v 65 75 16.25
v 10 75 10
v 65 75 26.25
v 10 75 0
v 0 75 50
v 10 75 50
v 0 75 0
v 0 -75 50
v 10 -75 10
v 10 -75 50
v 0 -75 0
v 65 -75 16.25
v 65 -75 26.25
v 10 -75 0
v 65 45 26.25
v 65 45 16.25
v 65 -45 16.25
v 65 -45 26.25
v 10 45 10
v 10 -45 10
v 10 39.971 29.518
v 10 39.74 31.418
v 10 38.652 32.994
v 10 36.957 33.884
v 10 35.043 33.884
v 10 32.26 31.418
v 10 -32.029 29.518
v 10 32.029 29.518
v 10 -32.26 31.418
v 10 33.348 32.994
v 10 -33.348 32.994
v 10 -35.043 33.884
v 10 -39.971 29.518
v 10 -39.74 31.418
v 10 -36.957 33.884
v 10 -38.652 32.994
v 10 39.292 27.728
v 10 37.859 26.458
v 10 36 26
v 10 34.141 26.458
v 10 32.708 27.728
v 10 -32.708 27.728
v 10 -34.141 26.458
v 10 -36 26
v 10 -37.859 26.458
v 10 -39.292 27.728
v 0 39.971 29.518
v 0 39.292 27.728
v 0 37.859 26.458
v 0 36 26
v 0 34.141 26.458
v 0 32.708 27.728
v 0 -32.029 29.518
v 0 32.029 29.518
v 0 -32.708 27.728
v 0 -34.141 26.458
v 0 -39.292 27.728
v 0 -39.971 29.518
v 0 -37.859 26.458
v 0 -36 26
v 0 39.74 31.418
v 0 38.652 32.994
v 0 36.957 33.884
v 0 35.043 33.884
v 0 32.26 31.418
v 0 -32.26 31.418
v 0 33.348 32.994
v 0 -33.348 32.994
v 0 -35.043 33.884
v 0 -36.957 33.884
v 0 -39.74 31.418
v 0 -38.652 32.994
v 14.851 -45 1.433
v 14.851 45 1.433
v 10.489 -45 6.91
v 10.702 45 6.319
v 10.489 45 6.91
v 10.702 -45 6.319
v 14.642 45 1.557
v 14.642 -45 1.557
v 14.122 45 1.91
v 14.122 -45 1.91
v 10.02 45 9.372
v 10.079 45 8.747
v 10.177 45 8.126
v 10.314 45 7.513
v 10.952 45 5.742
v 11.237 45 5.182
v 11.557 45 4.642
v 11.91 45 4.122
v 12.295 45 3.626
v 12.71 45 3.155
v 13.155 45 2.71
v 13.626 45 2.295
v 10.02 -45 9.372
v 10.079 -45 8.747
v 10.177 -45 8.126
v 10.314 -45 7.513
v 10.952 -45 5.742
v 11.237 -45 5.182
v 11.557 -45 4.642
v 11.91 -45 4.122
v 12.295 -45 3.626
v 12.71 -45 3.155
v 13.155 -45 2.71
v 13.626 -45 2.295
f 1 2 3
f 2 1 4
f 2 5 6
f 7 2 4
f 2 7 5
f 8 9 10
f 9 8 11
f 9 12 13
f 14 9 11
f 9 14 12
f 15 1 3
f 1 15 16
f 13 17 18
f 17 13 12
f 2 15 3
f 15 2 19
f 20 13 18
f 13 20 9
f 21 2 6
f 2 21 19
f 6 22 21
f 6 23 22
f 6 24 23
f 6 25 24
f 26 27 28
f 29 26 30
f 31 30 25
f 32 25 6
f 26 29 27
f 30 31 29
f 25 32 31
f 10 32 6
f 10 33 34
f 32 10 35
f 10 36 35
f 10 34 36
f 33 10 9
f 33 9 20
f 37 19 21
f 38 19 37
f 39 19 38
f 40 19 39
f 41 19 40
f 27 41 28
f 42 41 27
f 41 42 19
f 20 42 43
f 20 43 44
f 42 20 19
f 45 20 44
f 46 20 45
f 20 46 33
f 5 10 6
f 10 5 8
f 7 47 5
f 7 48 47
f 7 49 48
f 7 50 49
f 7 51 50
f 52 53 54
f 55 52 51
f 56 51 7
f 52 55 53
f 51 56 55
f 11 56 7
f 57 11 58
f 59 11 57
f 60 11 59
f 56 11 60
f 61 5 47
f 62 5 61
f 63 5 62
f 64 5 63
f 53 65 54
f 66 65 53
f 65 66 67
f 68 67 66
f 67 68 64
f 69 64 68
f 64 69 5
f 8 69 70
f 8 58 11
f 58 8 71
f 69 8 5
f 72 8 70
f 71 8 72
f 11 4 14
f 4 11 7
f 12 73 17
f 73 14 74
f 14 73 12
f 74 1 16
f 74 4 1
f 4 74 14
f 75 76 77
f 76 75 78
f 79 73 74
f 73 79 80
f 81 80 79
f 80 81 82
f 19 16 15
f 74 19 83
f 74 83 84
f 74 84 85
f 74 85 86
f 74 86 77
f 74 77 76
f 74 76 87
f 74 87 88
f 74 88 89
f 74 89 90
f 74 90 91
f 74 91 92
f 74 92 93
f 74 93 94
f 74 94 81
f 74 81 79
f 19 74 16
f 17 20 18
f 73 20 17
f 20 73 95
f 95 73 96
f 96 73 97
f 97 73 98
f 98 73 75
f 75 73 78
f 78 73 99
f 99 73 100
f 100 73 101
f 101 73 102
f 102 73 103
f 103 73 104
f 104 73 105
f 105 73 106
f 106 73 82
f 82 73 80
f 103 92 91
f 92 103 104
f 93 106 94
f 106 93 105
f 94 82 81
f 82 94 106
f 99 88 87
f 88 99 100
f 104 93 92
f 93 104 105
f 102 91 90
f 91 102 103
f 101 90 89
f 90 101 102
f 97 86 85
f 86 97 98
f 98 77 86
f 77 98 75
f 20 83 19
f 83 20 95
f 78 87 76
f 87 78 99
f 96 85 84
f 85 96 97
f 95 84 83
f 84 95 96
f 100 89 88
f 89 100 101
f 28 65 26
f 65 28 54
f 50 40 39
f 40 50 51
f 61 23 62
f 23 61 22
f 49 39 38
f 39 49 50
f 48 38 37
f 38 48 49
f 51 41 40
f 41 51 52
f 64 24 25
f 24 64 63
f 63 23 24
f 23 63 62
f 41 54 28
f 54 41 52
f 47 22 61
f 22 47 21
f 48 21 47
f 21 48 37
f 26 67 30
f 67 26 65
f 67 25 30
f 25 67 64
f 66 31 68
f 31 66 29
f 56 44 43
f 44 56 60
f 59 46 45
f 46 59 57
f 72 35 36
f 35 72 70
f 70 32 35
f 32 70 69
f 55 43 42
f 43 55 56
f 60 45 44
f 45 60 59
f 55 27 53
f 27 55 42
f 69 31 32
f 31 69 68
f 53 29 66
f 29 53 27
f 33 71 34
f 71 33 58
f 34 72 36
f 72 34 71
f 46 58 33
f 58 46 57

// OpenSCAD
wheel_gap_mm=90;
prong_width_mm=30;
prong_thickness=10;
prong_reach=65;
prong_raise=prong_reach/4;
base_thickness=10;
base_height=50;



difference() {

rotate([90,0,0]) {
linear_extrude(height=wheel_gap_mm+prong_width_mm+prong_width_mm,center=true, convexity=10, twist=0) {
polygon(points=[[0,0],
                [base_thickness,0],
                [prong_reach,prong_raise],
                [prong_reach,prong_raise+prong_thickness],
                [base_thickness,prong_thickness],
                [base_thickness,base_height],
                [0,base_height]], 
         paths=[[0,1,2,3,4,5,6]]);
}
}

// Rounded support at bottom of bracket
rotate([90,0,0]) {
translate( v = [base_thickness+prong_thickness,prong_thickness,0] ) {
cylinder (h=wheel_gap_mm,r=prong_thickness, center=true, $fn=100);
}}

// Remove material between prongs
//translate( v = [(base_thickness*2),0,-(prong_width_mm)]) {
rotate([90,0,0]) {
translate( v = [prong_reach-base_thickness,prong_raise,0]) {
cube(size=[prong_reach,prong_raise*2,wheel_gap_mm], center=true);
}
}

// Remove cylinders for screw holes
translate( v = [0,(wheel_gap_mm*.8)/2,base_height*.6] ) {
  rotate([0,90,0]) { 
      cylinder(h=base_thickness, r=4); 
  }
}
translate( v = [0,-(wheel_gap_mm*.8)/2,base_height*.6] ) {
  rotate([0,90,0]) { 
      cylinder(h=base_thickness, r=4); 
  }
}

}
